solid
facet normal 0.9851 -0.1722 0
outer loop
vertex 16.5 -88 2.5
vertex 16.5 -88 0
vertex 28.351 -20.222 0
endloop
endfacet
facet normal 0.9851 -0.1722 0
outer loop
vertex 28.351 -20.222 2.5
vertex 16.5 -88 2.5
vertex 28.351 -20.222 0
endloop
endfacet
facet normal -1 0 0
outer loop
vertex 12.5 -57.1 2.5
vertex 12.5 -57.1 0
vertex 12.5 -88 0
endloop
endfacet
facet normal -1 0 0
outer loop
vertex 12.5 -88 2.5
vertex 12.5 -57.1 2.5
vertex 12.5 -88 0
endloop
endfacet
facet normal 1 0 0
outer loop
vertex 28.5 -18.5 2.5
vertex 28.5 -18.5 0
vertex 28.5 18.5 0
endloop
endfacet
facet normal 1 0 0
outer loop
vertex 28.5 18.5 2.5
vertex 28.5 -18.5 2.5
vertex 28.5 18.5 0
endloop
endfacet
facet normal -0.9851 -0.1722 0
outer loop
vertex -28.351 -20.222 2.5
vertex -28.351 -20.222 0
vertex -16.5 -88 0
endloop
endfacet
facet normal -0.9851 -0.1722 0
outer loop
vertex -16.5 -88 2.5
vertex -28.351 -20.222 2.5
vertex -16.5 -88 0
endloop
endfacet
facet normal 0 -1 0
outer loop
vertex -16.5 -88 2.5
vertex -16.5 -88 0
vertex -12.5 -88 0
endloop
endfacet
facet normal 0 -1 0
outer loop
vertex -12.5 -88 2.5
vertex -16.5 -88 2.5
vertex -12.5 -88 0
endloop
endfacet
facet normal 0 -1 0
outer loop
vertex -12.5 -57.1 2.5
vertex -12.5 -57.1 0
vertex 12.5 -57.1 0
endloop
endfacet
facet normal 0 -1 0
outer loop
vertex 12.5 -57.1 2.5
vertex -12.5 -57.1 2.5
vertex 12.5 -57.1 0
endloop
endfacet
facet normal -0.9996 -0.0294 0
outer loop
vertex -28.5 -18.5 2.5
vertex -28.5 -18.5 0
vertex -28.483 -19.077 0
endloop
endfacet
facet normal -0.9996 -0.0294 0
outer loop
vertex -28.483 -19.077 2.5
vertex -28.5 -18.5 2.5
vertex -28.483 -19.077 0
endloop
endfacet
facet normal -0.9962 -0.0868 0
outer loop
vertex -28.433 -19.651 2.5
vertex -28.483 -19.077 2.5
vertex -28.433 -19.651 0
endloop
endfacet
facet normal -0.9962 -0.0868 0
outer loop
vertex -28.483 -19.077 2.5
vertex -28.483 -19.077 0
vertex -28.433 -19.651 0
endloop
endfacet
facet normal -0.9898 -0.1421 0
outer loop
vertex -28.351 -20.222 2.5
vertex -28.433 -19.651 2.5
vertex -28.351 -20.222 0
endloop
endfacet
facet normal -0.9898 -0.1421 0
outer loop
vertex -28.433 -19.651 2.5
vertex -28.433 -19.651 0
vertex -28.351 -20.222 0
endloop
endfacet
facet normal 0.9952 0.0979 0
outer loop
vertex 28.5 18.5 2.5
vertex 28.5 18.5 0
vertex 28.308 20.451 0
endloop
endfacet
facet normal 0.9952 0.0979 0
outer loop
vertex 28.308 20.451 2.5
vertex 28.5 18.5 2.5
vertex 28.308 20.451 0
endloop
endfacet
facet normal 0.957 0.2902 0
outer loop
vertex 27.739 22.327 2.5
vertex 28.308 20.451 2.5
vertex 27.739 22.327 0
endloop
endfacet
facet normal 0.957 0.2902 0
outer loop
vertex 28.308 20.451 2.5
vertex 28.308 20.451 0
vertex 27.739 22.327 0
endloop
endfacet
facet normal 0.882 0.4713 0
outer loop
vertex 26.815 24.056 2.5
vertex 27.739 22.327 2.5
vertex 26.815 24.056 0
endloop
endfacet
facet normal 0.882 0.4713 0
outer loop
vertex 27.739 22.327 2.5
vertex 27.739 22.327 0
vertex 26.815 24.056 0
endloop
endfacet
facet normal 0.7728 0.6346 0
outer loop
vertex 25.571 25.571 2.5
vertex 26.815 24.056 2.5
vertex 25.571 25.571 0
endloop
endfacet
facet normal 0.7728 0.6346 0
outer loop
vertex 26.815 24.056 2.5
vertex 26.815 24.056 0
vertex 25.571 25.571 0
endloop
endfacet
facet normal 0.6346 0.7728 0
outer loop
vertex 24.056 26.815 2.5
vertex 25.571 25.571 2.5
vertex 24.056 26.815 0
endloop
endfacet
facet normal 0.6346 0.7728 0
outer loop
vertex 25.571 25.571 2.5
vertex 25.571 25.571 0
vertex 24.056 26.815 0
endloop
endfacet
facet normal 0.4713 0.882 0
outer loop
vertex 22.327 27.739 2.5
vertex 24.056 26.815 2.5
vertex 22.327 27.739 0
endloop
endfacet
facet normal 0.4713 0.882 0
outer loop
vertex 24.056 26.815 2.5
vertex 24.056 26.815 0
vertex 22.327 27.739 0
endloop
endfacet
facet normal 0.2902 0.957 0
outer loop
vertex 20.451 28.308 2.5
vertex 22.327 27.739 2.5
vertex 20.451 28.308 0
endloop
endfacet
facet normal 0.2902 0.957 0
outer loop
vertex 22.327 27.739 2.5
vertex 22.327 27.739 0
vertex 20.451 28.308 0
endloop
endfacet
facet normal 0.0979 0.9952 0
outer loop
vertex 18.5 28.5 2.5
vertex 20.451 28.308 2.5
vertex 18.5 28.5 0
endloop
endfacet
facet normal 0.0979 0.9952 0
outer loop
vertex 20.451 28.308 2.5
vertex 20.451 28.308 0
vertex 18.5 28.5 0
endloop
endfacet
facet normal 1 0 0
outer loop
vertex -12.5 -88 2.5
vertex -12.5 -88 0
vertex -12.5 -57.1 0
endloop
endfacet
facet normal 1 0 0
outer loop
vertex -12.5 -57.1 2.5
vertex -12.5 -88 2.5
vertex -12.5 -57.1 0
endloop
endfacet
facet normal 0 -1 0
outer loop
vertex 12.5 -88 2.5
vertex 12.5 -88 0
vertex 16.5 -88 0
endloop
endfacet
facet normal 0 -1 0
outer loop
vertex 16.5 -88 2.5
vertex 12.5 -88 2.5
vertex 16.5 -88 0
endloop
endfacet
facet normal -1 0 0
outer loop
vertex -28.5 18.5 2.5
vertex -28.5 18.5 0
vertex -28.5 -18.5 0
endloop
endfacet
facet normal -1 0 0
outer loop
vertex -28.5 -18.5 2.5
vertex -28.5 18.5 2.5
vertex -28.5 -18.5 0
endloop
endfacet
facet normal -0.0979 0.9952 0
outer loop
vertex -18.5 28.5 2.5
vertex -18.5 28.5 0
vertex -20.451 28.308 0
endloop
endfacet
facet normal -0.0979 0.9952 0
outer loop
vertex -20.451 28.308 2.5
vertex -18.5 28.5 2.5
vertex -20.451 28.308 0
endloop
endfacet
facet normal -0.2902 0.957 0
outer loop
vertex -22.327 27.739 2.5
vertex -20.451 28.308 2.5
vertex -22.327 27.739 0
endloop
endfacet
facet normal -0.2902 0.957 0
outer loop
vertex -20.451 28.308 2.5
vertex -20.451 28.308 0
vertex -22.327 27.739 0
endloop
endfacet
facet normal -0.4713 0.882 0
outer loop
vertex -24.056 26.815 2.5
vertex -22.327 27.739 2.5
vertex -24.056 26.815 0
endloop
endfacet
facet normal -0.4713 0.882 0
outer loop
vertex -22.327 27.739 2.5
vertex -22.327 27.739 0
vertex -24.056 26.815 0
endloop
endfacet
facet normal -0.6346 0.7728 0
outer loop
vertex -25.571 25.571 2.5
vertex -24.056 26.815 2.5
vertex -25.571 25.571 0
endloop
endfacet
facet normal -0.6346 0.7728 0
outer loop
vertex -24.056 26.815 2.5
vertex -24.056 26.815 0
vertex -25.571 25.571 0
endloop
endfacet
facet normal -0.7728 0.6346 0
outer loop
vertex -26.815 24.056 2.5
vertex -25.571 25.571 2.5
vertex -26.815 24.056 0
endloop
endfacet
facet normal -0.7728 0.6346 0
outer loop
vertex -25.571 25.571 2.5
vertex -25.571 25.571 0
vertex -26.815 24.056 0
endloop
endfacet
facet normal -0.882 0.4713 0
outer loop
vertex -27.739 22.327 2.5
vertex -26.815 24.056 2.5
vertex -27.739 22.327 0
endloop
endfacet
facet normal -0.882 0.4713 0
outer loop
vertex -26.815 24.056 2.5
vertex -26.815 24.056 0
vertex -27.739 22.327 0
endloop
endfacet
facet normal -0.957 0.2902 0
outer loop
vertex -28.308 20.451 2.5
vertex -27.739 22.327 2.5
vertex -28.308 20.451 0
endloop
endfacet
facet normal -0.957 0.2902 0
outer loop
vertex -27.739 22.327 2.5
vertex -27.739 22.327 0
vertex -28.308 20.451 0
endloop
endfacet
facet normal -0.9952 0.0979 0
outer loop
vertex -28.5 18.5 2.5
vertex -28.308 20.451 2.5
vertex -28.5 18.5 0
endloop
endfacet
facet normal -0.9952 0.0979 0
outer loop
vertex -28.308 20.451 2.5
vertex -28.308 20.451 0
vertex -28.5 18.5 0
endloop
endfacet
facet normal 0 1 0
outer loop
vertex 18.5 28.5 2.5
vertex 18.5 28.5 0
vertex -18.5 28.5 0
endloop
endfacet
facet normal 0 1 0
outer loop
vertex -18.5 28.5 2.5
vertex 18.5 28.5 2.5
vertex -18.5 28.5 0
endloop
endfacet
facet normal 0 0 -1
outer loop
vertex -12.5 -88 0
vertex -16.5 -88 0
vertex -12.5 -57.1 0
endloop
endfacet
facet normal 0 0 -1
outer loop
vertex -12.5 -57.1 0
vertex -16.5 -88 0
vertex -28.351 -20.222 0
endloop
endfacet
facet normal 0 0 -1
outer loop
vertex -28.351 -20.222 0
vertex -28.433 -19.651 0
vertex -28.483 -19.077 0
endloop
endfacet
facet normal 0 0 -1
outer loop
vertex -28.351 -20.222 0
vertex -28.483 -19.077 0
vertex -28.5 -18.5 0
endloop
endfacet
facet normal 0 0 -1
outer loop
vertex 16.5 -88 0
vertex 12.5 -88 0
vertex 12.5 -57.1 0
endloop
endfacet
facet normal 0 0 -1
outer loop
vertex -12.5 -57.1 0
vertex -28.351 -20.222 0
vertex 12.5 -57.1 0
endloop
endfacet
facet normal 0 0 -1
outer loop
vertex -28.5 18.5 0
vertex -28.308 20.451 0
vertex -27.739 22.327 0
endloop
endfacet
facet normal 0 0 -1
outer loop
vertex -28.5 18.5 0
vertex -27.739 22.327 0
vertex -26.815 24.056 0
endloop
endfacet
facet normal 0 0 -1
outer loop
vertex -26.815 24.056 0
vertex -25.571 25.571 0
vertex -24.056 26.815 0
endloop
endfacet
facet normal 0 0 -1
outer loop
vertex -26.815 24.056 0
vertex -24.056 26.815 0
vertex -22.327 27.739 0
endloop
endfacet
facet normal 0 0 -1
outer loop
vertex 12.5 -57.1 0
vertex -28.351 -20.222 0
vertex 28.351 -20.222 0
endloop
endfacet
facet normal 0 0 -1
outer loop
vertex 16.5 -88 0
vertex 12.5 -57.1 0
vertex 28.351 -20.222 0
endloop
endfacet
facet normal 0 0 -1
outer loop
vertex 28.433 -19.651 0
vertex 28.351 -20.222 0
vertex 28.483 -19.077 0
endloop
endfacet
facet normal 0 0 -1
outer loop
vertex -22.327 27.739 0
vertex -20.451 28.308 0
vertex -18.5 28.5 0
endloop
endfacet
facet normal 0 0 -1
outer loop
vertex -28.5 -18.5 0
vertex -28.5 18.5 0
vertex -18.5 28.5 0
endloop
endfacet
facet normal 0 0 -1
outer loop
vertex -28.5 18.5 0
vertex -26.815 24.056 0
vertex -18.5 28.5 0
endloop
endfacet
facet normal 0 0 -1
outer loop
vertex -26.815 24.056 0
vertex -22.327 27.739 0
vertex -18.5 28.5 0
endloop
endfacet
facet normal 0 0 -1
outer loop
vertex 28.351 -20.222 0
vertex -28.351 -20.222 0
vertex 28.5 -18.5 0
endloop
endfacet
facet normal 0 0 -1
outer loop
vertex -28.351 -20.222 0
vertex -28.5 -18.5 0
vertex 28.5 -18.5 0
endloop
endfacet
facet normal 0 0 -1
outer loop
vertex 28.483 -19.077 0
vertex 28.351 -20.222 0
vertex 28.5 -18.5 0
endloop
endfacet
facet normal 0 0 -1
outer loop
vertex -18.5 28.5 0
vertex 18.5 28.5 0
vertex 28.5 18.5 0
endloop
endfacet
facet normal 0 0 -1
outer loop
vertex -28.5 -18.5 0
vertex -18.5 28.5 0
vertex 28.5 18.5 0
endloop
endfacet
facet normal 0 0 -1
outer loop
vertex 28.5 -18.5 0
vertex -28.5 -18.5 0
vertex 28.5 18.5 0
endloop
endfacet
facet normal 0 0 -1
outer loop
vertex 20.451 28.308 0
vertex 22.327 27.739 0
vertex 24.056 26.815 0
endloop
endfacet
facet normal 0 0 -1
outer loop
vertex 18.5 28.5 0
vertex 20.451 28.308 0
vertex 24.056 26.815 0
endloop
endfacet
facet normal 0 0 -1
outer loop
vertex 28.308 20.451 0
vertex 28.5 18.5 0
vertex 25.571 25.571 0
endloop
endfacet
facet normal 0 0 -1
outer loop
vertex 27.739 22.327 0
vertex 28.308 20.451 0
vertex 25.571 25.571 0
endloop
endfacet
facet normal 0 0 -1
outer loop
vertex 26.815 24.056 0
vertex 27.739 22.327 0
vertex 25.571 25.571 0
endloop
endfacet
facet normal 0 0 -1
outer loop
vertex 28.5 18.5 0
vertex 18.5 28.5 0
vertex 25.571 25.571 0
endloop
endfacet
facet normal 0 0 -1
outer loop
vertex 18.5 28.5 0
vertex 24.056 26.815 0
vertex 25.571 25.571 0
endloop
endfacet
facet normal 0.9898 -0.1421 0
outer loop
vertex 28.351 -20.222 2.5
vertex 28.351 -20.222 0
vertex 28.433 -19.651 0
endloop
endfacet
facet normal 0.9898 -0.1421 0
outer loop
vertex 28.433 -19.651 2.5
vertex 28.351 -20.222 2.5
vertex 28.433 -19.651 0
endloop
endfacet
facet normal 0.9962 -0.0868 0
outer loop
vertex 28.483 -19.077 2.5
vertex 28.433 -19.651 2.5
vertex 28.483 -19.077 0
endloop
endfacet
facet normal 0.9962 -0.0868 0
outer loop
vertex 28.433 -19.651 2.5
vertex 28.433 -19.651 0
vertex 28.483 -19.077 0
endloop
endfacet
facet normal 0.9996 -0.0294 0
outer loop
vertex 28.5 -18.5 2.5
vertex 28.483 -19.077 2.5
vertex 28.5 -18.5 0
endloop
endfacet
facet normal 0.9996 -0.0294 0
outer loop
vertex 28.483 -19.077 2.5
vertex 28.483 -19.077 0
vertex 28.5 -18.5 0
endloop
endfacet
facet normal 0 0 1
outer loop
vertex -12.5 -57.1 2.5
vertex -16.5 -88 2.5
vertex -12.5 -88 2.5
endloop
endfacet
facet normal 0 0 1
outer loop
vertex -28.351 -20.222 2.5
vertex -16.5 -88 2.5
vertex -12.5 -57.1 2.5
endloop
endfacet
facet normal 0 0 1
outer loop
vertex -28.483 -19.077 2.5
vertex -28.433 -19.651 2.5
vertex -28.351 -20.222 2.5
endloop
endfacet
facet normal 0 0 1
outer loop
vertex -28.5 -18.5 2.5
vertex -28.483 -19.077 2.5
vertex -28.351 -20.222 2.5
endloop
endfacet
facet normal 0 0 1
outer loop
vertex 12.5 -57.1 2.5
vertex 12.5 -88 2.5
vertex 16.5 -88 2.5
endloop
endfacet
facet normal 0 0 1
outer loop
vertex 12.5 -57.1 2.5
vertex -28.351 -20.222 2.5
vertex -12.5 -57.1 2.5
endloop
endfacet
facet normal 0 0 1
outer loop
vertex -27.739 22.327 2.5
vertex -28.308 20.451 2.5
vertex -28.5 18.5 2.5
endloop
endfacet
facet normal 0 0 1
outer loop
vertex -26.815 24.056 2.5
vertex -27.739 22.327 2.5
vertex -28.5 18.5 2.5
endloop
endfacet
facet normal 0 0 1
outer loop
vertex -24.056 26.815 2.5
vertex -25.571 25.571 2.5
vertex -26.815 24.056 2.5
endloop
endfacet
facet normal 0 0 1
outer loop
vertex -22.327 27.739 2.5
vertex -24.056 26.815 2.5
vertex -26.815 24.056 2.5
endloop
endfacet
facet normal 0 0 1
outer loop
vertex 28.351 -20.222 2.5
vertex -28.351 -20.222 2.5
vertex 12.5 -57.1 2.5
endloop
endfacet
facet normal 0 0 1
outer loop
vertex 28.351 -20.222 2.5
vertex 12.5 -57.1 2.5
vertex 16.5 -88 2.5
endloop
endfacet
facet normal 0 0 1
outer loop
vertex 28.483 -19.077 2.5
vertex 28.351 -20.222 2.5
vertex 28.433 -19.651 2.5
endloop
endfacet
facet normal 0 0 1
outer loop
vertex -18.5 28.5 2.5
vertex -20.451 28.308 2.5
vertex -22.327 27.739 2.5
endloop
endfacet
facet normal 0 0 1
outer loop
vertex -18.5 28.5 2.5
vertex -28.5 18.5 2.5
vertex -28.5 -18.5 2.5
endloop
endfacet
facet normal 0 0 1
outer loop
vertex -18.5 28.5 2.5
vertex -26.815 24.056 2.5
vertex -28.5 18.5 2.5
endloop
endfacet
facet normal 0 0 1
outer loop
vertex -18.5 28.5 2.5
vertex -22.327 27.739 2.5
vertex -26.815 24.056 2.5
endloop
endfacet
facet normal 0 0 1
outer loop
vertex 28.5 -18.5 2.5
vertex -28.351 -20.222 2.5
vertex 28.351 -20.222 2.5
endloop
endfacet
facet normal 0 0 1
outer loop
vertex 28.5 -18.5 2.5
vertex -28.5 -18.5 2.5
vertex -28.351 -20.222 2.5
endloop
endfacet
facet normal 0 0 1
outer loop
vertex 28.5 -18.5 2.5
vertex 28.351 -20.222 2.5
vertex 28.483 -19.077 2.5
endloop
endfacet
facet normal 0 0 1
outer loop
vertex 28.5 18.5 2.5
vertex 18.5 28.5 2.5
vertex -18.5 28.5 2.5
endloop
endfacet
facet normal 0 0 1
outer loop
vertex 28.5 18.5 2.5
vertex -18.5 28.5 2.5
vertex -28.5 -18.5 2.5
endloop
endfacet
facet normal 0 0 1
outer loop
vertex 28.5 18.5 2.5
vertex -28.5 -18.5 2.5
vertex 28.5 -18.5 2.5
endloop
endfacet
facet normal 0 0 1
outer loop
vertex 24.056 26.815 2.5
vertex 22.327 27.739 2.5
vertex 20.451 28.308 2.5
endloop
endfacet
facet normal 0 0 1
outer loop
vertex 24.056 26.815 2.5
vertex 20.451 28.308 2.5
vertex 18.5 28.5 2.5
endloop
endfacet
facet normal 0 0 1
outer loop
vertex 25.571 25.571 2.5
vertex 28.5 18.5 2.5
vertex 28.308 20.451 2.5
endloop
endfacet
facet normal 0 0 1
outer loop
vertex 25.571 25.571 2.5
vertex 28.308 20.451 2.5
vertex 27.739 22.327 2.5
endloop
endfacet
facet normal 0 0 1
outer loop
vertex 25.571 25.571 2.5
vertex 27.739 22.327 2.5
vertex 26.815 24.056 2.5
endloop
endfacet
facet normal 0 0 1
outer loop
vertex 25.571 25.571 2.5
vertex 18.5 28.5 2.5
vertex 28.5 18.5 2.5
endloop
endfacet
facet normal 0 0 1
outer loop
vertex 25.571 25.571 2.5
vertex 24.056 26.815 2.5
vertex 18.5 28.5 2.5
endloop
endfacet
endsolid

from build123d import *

# Parameters (mm, degrees)
SALIENTE_EXTRUIR1_DEPTH = 2.5


with BuildPart() as part:
    # Croquis1 → Saliente-Extruir1 (new body)
    with BuildSketch(Plane.XY):
        with BuildLine():
            Line((-16.5, -88), (-12.5, -88))
            Line((-12.5, -88), (-12.5, -57.1))
            Line((-12.5, -57.1), (12.5, -57.1))
            Line((12.5, -57.1), (12.5, -88))
            Line((12.5, -88), (16.5, -88))
            Line((16.5, -88), (28.350564417, -20.2223184))
            ThreePointArc((28.350564417, -20.2223184), (28.462571058, -19.364394538), (28.5, -18.5))
            Line((28.5, -18.5), (28.5, 18.5))
            ThreePointArc((28.5, 18.5), (25.571067812, 25.571067812), (18.5, 28.5))
            Line((18.5, 28.5), (-18.5, 28.5))
            ThreePointArc((-18.5, 28.5), (-25.571067812, 25.571067812), (-28.5, 18.5))
            Line((-28.5, 18.5), (-28.5, -18.5))
            ThreePointArc((-28.5, -18.5), (-28.462571058, -19.364394538), (-28.350564417, -20.2223184))
            Line((-28.350564417, -20.2223184), (-16.5, -88))
        make_face()
    extrude(amount=SALIENTE_EXTRUIR1_DEPTH)


solid = part.part
